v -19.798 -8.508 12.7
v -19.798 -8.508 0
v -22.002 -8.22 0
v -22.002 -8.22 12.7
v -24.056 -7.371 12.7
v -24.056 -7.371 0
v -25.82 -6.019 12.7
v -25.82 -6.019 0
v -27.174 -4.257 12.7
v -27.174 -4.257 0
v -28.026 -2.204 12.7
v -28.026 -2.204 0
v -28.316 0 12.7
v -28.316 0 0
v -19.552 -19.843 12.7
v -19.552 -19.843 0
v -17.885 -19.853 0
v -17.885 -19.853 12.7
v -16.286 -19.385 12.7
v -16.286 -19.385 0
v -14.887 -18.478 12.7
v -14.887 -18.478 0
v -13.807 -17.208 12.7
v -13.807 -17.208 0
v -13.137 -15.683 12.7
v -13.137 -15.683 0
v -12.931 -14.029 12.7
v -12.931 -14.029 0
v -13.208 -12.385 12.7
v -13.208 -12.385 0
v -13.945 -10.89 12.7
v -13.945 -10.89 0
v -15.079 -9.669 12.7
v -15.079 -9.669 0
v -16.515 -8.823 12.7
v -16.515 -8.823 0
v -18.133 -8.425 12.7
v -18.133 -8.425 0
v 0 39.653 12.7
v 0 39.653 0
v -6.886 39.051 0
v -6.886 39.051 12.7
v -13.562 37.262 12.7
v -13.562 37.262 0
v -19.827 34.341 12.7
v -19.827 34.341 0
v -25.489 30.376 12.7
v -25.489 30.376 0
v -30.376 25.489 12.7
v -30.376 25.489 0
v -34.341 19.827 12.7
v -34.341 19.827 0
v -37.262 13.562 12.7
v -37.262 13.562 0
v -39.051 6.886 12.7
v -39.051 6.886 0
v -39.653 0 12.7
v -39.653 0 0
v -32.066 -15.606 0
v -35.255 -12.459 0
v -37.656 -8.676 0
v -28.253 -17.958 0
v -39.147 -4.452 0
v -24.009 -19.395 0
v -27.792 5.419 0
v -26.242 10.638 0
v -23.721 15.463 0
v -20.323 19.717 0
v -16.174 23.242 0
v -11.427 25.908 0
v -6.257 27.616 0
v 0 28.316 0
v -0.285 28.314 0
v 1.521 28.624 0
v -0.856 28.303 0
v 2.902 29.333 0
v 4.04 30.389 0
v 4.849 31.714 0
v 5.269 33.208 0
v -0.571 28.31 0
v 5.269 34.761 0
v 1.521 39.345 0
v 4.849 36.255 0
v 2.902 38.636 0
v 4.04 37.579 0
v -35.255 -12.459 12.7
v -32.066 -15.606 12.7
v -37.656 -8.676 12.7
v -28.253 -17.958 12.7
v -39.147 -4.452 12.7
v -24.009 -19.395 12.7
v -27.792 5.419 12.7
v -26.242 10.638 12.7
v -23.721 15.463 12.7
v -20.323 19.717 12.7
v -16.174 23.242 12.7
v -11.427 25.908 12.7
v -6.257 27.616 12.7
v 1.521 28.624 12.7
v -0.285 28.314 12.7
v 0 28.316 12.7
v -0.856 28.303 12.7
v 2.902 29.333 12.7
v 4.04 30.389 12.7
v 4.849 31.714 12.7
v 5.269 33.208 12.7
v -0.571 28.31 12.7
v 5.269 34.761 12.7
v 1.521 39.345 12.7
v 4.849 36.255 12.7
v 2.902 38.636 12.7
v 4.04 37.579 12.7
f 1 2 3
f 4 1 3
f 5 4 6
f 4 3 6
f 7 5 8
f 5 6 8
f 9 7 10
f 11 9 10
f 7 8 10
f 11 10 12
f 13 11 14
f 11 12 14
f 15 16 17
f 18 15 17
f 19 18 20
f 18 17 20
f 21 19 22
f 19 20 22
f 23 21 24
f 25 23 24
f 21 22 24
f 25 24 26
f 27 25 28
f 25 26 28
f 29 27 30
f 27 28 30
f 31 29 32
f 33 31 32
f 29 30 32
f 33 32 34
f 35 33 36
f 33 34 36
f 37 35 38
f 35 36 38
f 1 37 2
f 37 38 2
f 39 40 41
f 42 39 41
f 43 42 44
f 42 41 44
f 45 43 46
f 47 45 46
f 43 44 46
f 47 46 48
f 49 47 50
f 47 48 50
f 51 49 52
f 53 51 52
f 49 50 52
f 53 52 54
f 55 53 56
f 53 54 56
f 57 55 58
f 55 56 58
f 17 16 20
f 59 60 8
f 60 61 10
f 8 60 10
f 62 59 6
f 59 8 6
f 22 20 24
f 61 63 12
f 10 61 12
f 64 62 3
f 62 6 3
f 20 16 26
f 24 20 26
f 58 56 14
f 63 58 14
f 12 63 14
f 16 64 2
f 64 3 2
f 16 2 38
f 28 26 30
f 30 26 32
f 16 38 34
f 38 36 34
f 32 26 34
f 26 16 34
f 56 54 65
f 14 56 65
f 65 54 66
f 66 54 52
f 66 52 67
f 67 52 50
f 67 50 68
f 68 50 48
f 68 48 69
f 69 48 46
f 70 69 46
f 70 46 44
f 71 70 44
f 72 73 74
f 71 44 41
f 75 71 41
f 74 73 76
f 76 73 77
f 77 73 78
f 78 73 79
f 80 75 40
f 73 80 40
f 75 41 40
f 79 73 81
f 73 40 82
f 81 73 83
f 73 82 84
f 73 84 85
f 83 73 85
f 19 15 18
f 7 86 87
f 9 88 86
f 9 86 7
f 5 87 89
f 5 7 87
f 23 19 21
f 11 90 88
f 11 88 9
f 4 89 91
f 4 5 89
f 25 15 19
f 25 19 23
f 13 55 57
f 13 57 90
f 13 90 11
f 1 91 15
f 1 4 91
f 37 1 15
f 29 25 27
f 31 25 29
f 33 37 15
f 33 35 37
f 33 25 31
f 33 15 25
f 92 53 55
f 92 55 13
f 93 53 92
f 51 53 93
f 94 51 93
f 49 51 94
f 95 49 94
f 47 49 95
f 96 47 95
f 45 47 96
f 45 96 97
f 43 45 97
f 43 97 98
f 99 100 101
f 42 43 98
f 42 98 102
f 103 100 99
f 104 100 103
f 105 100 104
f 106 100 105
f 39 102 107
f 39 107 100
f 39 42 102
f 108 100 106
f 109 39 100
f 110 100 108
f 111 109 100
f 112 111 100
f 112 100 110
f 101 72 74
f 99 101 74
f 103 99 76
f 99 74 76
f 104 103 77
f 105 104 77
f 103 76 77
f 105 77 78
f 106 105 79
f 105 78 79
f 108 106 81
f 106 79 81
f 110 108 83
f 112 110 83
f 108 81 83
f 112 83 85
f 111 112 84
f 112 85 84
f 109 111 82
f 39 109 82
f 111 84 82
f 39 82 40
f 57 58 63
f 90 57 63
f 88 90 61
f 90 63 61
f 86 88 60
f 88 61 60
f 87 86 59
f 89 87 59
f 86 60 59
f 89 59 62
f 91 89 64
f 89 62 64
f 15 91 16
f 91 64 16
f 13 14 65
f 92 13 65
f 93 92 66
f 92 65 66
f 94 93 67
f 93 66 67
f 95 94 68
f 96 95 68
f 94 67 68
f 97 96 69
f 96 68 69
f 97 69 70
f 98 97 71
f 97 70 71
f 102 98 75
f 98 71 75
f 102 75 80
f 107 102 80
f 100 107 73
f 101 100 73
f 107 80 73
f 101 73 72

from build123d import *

# Parameters (mm, degrees)
F1_DEPTH = 12.7


with BuildPart() as f1:
    # F0 (on Top) → F1 (new body)
    with BuildSketch(Plane.XY):
        with BuildLine():
            ThreePointArc((-0.856272, 28.302937), (-0.428185, 28.312649), (0, 28.315887))
            ThreePointArc((0, 28.315887), (5.32199, 33.984497), (0, 39.653108))
            ThreePointArc((0, 39.653108), (-28.038981, 28.038981), (-39.653108, 0))
            ThreePointArc((-39.653108, 0), (-33.749679, -14.1228), (-19.551708, -19.843075))
            ThreePointArc((-19.551708, -19.843075), (-12.931084, -14.028775), (-19.797987, -8.507508))
            ThreePointArc((-19.797987, -8.507508), (-25.820421, -6.019392), (-28.315887, 0))
            ThreePointArc((-28.315887, 0), (-20.322839, 19.717294), (-0.856272, 28.302937))
        make_face()
    extrude(amount=F1_DEPTH)


solid = f1.part
